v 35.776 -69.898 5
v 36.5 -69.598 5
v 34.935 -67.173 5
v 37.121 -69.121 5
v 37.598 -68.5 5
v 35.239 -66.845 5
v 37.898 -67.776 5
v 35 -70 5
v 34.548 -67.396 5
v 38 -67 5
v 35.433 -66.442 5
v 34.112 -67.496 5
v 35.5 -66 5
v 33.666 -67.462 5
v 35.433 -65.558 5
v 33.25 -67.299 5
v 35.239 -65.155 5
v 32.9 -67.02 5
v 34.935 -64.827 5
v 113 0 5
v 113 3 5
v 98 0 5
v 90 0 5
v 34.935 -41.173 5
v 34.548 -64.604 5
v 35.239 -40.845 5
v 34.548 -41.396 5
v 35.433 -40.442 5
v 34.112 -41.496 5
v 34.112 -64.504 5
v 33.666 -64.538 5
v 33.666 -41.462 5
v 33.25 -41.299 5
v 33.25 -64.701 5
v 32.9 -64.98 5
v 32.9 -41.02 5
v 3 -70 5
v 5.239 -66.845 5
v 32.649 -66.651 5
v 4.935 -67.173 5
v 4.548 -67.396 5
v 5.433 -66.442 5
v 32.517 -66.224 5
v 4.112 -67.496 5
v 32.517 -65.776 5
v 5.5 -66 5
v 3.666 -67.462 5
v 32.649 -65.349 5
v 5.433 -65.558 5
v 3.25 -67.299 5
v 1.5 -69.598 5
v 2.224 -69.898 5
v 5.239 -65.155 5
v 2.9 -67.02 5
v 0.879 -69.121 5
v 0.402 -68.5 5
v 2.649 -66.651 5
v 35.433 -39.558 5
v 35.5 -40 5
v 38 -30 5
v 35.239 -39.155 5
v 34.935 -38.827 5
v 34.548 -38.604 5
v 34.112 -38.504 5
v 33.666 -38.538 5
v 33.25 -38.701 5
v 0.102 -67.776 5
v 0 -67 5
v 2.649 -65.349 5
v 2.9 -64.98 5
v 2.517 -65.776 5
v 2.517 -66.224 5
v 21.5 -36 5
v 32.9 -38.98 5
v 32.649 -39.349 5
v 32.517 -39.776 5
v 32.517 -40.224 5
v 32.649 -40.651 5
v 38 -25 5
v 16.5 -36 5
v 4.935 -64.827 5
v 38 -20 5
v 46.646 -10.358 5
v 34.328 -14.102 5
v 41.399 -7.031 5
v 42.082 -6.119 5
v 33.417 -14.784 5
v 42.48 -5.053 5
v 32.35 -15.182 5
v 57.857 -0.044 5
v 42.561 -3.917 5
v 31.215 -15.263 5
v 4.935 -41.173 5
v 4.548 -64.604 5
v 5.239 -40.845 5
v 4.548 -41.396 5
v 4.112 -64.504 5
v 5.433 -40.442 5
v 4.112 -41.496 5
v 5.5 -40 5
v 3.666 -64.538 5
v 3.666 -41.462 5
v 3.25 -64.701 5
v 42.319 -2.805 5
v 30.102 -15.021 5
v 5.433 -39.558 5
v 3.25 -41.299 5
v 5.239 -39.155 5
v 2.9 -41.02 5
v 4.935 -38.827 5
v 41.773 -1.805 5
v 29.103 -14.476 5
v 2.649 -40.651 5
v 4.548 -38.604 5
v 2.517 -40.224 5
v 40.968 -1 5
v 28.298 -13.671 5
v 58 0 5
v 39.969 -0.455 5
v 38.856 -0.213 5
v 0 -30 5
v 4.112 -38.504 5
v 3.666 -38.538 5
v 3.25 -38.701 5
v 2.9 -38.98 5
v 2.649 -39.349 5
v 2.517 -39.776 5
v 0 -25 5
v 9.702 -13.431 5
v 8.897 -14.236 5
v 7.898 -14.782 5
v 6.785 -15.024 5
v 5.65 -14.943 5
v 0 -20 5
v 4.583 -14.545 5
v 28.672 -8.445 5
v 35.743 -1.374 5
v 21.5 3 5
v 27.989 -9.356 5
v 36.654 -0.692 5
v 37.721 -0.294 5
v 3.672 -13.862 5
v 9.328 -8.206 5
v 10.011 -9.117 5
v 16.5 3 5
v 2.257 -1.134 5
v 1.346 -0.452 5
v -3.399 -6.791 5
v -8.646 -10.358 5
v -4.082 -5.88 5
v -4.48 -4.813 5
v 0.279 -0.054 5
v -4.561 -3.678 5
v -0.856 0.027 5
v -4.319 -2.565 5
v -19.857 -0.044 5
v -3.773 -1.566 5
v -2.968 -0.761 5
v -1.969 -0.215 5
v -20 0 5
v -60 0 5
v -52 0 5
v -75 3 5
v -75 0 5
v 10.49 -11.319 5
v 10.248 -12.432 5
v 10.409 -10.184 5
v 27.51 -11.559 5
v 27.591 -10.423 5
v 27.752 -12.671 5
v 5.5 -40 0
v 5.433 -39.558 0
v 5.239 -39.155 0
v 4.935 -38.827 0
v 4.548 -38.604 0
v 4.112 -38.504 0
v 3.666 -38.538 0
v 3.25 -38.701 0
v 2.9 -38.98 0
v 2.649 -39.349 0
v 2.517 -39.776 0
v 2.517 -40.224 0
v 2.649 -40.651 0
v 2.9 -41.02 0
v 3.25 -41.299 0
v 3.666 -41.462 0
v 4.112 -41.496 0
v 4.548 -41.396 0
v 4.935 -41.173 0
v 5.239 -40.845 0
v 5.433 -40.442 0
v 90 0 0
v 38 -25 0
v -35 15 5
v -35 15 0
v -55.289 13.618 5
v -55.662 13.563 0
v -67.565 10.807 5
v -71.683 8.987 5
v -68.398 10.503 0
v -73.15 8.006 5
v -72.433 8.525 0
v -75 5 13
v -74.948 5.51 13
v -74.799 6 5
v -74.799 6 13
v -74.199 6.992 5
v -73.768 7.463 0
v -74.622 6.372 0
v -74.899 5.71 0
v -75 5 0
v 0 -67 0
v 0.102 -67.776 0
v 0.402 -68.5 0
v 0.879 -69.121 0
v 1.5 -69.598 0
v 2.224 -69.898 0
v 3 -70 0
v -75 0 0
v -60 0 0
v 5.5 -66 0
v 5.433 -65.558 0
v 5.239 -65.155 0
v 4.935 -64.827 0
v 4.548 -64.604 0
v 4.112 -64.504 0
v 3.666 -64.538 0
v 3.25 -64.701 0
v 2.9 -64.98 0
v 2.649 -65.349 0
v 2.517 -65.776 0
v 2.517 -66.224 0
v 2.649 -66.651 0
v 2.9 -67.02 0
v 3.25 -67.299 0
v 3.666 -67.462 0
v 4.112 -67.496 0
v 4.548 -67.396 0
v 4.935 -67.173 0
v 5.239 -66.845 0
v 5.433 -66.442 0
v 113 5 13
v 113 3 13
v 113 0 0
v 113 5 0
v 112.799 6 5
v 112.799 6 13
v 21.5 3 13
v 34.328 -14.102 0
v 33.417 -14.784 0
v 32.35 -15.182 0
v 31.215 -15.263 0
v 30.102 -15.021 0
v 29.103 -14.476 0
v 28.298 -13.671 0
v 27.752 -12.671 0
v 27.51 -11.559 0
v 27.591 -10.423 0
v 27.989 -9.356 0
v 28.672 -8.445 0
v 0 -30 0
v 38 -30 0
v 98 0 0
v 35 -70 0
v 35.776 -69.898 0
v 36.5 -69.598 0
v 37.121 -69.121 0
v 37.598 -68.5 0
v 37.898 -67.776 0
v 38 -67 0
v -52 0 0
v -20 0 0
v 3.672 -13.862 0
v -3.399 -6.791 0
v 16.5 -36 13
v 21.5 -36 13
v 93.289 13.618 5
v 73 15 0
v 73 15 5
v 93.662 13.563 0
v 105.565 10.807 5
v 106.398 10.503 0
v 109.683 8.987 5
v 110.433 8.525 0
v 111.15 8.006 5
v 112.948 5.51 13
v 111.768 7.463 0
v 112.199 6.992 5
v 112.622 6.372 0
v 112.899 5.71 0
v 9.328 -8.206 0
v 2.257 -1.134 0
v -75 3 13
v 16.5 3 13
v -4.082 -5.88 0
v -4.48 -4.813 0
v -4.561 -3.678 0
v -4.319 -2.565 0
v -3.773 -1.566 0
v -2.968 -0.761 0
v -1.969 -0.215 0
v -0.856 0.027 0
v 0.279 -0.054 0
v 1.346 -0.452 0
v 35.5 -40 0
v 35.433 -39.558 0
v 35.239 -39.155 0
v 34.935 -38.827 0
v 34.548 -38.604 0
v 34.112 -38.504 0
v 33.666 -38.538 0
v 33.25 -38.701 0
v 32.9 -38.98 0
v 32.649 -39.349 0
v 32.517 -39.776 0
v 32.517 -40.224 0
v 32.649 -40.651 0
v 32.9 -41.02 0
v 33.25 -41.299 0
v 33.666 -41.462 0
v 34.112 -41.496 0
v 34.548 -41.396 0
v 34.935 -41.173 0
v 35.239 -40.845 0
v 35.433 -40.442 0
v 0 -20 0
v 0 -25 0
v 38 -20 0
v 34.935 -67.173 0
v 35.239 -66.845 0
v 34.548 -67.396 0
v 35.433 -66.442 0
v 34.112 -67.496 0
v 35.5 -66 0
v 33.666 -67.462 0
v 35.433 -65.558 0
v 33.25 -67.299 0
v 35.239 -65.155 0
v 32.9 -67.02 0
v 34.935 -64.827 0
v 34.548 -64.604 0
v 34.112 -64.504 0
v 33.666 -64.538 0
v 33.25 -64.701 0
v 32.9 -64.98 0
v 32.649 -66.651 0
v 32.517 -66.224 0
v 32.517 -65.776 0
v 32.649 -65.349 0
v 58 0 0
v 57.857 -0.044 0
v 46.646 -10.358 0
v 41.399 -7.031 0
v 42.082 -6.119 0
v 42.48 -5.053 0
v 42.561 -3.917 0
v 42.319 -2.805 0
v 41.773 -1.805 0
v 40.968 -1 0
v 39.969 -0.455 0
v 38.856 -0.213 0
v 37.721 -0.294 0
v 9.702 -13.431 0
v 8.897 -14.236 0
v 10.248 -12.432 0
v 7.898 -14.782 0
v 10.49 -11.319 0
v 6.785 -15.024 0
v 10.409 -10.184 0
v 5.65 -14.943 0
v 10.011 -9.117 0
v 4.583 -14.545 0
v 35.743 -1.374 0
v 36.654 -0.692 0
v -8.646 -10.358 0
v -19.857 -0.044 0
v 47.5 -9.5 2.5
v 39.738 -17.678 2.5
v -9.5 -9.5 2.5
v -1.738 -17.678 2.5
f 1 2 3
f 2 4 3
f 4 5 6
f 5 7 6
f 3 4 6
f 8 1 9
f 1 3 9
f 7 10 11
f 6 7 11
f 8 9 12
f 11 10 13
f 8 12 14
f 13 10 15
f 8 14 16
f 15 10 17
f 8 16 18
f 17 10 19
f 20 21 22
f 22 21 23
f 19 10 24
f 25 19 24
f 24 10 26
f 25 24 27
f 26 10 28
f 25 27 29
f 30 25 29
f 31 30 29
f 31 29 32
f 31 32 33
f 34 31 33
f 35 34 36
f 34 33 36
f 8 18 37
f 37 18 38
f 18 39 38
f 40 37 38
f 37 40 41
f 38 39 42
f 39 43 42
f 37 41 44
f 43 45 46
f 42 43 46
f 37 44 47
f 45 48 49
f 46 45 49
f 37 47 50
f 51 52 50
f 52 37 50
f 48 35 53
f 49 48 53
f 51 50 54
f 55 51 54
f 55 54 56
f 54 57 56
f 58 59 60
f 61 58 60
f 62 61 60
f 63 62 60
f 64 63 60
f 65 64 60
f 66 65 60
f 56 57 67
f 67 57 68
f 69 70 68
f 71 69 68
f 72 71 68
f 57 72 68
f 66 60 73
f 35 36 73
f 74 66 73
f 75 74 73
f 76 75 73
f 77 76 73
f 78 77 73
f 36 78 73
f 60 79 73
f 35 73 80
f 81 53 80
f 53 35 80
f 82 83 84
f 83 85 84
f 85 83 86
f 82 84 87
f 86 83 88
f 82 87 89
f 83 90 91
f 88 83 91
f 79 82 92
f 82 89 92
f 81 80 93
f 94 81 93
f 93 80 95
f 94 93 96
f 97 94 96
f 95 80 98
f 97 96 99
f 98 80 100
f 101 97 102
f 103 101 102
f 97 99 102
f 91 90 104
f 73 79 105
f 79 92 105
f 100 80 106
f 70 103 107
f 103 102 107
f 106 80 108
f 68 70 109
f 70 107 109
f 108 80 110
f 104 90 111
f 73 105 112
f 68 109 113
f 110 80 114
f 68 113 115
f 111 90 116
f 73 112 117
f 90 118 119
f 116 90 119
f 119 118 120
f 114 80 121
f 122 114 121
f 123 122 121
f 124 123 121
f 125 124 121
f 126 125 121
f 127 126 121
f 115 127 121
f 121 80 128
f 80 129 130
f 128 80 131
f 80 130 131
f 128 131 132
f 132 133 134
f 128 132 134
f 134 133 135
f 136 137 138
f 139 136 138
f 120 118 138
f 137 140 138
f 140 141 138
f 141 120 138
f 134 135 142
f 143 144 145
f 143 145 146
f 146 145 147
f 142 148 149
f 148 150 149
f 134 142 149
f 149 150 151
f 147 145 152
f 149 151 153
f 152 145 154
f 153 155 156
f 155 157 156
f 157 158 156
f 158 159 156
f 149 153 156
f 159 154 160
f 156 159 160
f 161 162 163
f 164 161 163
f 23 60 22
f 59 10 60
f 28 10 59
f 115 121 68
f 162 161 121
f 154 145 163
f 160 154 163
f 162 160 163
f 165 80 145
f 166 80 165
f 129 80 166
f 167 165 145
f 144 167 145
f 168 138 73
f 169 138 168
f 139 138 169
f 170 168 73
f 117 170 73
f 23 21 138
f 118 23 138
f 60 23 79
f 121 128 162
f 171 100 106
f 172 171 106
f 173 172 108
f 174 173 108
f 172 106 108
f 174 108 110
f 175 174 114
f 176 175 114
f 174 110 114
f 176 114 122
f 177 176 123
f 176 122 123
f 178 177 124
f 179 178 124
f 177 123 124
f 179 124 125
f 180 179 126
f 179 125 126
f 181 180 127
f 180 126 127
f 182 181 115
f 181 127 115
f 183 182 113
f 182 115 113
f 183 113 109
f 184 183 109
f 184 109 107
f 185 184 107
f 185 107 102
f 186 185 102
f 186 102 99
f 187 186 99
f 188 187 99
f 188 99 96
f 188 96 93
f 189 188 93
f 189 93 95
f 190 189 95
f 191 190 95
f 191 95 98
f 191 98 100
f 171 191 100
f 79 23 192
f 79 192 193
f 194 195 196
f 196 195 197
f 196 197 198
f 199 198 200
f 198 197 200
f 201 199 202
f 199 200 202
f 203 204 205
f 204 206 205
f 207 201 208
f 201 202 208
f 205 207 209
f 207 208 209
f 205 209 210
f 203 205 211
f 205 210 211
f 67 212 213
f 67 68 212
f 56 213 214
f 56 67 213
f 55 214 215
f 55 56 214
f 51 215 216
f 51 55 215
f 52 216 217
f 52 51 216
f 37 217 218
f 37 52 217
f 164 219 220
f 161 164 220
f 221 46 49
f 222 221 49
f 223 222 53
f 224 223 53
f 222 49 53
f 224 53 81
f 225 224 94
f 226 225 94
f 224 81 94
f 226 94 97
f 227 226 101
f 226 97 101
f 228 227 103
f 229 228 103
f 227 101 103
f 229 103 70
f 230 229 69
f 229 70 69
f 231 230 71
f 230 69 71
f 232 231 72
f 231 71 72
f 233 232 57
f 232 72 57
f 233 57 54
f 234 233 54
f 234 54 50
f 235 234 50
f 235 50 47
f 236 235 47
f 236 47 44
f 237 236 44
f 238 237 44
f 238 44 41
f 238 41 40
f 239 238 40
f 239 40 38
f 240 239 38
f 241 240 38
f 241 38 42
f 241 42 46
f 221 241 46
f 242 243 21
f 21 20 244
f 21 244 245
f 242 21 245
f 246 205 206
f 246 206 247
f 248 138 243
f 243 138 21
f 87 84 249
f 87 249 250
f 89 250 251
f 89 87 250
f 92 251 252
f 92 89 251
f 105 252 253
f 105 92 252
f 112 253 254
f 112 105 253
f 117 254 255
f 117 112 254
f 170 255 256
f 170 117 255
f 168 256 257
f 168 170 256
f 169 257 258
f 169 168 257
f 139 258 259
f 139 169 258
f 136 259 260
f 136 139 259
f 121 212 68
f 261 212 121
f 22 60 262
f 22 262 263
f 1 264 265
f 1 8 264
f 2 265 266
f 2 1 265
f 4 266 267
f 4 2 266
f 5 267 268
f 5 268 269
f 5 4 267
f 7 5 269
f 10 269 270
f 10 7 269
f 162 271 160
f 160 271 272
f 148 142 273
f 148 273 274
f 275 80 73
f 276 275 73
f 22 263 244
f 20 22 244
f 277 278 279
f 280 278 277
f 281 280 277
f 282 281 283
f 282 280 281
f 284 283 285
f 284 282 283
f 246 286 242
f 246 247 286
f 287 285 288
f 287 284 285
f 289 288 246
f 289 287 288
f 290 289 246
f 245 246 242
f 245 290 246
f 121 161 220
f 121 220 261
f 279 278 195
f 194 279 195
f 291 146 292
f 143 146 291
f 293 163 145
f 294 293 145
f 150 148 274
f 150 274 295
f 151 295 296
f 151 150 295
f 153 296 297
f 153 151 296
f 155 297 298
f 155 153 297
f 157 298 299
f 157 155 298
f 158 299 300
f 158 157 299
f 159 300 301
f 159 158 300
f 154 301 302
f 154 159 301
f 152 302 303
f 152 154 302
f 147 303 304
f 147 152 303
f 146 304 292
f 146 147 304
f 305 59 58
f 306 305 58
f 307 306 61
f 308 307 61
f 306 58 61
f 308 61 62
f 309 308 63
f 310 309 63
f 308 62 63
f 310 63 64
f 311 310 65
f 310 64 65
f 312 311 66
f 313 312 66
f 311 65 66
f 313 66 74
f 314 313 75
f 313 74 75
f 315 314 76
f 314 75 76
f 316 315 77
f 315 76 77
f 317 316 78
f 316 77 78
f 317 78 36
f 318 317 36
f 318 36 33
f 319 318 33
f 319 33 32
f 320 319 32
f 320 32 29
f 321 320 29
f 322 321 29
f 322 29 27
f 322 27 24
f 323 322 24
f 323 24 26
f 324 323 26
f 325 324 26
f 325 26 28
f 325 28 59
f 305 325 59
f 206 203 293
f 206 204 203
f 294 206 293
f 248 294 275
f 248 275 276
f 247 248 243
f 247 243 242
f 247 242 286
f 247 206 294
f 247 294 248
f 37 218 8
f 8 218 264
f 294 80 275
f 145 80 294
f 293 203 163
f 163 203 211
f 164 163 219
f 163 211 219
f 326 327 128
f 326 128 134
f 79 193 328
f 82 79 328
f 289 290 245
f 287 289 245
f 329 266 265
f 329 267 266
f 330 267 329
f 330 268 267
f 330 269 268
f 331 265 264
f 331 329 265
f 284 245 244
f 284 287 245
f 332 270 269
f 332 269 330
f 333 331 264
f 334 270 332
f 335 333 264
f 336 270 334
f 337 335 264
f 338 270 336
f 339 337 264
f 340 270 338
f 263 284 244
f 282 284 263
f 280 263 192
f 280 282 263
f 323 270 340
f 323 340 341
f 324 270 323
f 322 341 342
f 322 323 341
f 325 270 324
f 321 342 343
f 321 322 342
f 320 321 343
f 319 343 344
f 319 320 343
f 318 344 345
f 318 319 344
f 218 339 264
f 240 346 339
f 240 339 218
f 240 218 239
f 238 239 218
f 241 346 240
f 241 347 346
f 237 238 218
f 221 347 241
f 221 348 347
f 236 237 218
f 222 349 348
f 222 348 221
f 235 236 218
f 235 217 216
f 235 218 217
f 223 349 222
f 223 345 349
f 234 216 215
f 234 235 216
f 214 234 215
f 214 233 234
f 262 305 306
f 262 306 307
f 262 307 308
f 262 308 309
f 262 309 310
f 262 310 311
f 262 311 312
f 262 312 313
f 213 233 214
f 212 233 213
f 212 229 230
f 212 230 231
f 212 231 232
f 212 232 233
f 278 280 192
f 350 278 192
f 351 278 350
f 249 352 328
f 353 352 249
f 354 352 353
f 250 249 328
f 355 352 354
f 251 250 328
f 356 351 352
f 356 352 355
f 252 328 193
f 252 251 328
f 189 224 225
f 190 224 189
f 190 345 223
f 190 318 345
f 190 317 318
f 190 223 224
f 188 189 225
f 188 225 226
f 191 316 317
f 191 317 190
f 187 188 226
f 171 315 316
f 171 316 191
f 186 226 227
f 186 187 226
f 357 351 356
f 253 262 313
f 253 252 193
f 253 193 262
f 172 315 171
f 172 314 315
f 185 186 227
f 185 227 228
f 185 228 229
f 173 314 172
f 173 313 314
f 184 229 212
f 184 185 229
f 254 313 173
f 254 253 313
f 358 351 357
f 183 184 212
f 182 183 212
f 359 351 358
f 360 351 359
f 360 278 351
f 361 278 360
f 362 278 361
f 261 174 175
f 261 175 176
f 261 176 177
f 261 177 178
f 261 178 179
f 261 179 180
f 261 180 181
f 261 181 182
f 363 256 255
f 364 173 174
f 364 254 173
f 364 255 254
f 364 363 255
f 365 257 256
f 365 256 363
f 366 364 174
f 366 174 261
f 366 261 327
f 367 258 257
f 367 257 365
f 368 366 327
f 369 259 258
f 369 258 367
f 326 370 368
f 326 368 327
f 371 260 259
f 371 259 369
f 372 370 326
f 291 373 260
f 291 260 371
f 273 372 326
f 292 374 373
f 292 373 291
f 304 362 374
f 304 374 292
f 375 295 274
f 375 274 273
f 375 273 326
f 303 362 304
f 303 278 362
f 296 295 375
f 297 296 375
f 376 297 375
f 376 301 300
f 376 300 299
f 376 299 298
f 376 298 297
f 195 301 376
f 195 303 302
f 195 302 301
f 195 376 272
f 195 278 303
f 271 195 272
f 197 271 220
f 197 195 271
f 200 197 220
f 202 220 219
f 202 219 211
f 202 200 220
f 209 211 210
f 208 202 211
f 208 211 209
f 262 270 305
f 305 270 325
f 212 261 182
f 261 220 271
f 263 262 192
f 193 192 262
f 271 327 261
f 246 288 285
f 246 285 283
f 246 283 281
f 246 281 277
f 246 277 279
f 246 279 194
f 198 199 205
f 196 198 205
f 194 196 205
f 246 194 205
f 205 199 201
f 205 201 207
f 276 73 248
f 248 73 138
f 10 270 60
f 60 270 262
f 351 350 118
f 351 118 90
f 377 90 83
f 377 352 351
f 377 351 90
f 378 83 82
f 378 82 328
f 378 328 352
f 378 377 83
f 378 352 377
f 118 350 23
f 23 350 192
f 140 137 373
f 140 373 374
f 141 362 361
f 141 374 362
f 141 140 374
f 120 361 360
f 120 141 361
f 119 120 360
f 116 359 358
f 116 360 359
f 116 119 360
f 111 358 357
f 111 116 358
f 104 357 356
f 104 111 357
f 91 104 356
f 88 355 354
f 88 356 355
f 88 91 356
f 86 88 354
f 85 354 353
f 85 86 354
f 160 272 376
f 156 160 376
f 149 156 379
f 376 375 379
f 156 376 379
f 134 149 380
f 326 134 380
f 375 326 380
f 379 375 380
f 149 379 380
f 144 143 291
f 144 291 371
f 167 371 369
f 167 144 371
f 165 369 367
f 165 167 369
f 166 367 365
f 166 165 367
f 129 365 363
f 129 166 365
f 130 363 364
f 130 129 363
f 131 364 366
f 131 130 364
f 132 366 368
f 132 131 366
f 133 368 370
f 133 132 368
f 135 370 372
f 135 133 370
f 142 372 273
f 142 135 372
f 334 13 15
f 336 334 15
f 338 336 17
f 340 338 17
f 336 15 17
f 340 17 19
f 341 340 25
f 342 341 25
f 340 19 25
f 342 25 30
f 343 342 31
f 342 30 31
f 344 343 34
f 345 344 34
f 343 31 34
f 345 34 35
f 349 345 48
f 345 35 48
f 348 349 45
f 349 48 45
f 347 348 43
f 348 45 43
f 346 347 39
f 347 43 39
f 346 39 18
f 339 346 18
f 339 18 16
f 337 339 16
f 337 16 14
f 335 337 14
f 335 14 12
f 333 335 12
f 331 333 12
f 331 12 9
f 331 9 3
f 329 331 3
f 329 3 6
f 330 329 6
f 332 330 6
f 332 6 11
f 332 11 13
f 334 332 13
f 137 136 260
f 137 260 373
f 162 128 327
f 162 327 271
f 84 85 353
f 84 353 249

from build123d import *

# Parameters (mm, degrees)
SKETCH1_W           = 38
SKETCH1_H           = 70
BOSS_EXTRUDE1_DEPTH = 5
SKETCH2_R           = 1.5
CUT_EXTRUDE1_DEPTH  = 134.018795664
FILLET1_R           = 3
FILLET2_DEPTH       = 5
SKETCH3_W           = 188
SKETCH3_H           = 3
BOSS_EXTRUDE2_DEPTH = 8
SKETCH4_W           = 5
SKETCH4_H           = 39
BOSS_EXTRUDE3_DEPTH = 8
BOSS_EXTRUDE4_DEPTH = 5
FILLET3_SIZE        = 40
FILLET3_SIZE_2      = 10
FILLET4_SIZE        = 40
FILLET4_SIZE_2      = 10
CUT_EXTRUDE2_DEPTH  = 134.165310942


with BuildPart() as part:
    # Sketch1 → Boss-Extrude1 (new body)
    with BuildSketch(Plane.XY):
        with Locations((19, -35)):
            Rectangle(SKETCH1_W, SKETCH1_H)
        Polygon((-75, 15), (-75, 0), (0, 0), (38, 0), (113, 0), (113, 15), align=None)
    extrude(amount=BOSS_EXTRUDE1_DEPTH)

    # Sketch2 → Cut-Extrude1 (cut, through all)
    with BuildSketch(Plane.XY.offset(5)):
        with Locations((34, -66)):
            Circle(SKETCH2_R)
        with Locations((4, -66)):
            Circle(SKETCH2_R)
        with Locations((4, -40)):
            Circle(SKETCH2_R)
        with Locations((34, -40)):
            Circle(SKETCH2_R)
    extrude(amount=-CUT_EXTRUDE1_DEPTH, mode=Mode.SUBTRACT)

    # Fillet1
    fillet1_edges = [part.edges().sort_by_distance(p)[0] for p in [
        (38, -70, 2.5),
        (0, -70, 2.5),
    ]]
    fillet(fillet1_edges, radius=FILLET1_R)

    # Fillet2: read off the stored shape, not the designer's step
    # Fillet2 outline → Fillet2 (add)
    with BuildSketch(Plane.XY):
        with BuildLine():
            add(Edge.make_bspline(
                [(58, 0), (38, 0), (38, -20)],
                knots=[0, 0, 0, 1, 1, 1], degree=2, weights=[1, 0.052631579, 1]))
            Line((58, 0), (38, 0))
            Line((38, 0), (38, -20))
        make_face()
        with BuildLine():
            Line((0, 0), (-20, 0))
            add(Edge.make_bspline(
                [(-20, 0), (0, 0), (0, -20)],
                knots=[0, 0, 0, 1, 1, 1], degree=2, weights=[1, 0.052631579, 1]))
            Line((0, -20), (0, 0))
        make_face()
    extrude(amount=FILLET2_DEPTH)

    # Sketch3 → Boss-Extrude2 (add)
    with BuildSketch(Plane.XY.offset(5)):
        with Locations((19, 4.5)):
            Rectangle(SKETCH3_W, SKETCH3_H)
    extrude(amount=BOSS_EXTRUDE2_DEPTH)

    # Sketch4 → Boss-Extrude3 (add)
    with BuildSketch(Plane.XY.offset(5)):
        with Locations((19, -16.5)):
            Rectangle(SKETCH4_W, SKETCH4_H)
    extrude(amount=BOSS_EXTRUDE3_DEPTH)

    # Sketch5 → Boss-Extrude4 (add)
    with BuildSketch(Plane.XY.offset(5)):
        Polygon((-52, 0), (-57.902965871, 0), (-60, 0), (0, -30), (0, -25), align=None)
        Polygon((38, -30), (98, 0), (90, 0), (38, -25), align=None)
    extrude(amount=-BOSS_EXTRUDE4_DEPTH)

    # Fillet3
    # a fillet whose section is not a circle: 40, 10 mm, written as the material it takes off along each edge
    with BuildSketch(Plane(origin=(-75, 15, -100), x_dir=(1, 0, 0), z_dir=(0, 0, 1))) as fillet3_piece_1:
        with BuildLine():
            Bezier((FILLET3_SIZE, 0), (0, 0), (0, -FILLET3_SIZE_2), weights=[1, 0.707106781, 1])
            Line((0, -FILLET3_SIZE_2), (0, 0))
            Line((0, 0), (FILLET3_SIZE, 0))
        make_face()
    extrude(amount=205, mode=Mode.SUBTRACT)

    # Fillet4
    # a fillet whose section is not a circle: 40, 10 mm, written as the material it takes off along each edge
    with BuildSketch(Plane(origin=(113, 15, -100), x_dir=(-1, 0, 0), z_dir=(0, 0, 1))) as fillet4_piece_1:
        with BuildLine():
            Bezier((FILLET4_SIZE, 0), (0, 0), (0, FILLET4_SIZE_2), weights=[1, 0.707106781, 1])
            Line((0, FILLET4_SIZE_2), (0, 0))
            Line((0, 0), (FILLET4_SIZE, 0))
        make_face()
    extrude(amount=205, mode=Mode.SUBTRACT)

    # Sketch6 → Cut-Extrude2 (cut, through all)
    with BuildSketch(Plane.XY.offset(5)):
        with BuildLine():
            Line((3.671572875, -13.862410437), (-3.399494937, -6.791342626))
            ThreePointArc((-3.399494937, -6.791342626), (-3.399494937, -1.134488376), (2.257359313, -1.134488376))
            Line((2.257359313, -1.134488376), (9.328427125, -8.205556188))
            ThreePointArc((9.328427125, -8.205556188), (9.328427125, -13.862410437), (3.671572875, -13.862410437))
        make_face()
        with BuildLine():
            Line((28.671572875, -8.445013015), (35.742640687, -1.373945203))
            ThreePointArc((35.742640687, -1.373945203), (41.399494937, -1.373945203), (41.399494937, -7.030799453))
            Line((41.399494937, -7.030799453), (34.328427125, -14.101867265))
            ThreePointArc((34.328427125, -14.101867265), (28.671572875, -14.101867265), (28.671572875, -8.445013015))
        make_face()
    extrude(amount=-CUT_EXTRUDE2_DEPTH, mode=Mode.SUBTRACT)


solid = part.part
